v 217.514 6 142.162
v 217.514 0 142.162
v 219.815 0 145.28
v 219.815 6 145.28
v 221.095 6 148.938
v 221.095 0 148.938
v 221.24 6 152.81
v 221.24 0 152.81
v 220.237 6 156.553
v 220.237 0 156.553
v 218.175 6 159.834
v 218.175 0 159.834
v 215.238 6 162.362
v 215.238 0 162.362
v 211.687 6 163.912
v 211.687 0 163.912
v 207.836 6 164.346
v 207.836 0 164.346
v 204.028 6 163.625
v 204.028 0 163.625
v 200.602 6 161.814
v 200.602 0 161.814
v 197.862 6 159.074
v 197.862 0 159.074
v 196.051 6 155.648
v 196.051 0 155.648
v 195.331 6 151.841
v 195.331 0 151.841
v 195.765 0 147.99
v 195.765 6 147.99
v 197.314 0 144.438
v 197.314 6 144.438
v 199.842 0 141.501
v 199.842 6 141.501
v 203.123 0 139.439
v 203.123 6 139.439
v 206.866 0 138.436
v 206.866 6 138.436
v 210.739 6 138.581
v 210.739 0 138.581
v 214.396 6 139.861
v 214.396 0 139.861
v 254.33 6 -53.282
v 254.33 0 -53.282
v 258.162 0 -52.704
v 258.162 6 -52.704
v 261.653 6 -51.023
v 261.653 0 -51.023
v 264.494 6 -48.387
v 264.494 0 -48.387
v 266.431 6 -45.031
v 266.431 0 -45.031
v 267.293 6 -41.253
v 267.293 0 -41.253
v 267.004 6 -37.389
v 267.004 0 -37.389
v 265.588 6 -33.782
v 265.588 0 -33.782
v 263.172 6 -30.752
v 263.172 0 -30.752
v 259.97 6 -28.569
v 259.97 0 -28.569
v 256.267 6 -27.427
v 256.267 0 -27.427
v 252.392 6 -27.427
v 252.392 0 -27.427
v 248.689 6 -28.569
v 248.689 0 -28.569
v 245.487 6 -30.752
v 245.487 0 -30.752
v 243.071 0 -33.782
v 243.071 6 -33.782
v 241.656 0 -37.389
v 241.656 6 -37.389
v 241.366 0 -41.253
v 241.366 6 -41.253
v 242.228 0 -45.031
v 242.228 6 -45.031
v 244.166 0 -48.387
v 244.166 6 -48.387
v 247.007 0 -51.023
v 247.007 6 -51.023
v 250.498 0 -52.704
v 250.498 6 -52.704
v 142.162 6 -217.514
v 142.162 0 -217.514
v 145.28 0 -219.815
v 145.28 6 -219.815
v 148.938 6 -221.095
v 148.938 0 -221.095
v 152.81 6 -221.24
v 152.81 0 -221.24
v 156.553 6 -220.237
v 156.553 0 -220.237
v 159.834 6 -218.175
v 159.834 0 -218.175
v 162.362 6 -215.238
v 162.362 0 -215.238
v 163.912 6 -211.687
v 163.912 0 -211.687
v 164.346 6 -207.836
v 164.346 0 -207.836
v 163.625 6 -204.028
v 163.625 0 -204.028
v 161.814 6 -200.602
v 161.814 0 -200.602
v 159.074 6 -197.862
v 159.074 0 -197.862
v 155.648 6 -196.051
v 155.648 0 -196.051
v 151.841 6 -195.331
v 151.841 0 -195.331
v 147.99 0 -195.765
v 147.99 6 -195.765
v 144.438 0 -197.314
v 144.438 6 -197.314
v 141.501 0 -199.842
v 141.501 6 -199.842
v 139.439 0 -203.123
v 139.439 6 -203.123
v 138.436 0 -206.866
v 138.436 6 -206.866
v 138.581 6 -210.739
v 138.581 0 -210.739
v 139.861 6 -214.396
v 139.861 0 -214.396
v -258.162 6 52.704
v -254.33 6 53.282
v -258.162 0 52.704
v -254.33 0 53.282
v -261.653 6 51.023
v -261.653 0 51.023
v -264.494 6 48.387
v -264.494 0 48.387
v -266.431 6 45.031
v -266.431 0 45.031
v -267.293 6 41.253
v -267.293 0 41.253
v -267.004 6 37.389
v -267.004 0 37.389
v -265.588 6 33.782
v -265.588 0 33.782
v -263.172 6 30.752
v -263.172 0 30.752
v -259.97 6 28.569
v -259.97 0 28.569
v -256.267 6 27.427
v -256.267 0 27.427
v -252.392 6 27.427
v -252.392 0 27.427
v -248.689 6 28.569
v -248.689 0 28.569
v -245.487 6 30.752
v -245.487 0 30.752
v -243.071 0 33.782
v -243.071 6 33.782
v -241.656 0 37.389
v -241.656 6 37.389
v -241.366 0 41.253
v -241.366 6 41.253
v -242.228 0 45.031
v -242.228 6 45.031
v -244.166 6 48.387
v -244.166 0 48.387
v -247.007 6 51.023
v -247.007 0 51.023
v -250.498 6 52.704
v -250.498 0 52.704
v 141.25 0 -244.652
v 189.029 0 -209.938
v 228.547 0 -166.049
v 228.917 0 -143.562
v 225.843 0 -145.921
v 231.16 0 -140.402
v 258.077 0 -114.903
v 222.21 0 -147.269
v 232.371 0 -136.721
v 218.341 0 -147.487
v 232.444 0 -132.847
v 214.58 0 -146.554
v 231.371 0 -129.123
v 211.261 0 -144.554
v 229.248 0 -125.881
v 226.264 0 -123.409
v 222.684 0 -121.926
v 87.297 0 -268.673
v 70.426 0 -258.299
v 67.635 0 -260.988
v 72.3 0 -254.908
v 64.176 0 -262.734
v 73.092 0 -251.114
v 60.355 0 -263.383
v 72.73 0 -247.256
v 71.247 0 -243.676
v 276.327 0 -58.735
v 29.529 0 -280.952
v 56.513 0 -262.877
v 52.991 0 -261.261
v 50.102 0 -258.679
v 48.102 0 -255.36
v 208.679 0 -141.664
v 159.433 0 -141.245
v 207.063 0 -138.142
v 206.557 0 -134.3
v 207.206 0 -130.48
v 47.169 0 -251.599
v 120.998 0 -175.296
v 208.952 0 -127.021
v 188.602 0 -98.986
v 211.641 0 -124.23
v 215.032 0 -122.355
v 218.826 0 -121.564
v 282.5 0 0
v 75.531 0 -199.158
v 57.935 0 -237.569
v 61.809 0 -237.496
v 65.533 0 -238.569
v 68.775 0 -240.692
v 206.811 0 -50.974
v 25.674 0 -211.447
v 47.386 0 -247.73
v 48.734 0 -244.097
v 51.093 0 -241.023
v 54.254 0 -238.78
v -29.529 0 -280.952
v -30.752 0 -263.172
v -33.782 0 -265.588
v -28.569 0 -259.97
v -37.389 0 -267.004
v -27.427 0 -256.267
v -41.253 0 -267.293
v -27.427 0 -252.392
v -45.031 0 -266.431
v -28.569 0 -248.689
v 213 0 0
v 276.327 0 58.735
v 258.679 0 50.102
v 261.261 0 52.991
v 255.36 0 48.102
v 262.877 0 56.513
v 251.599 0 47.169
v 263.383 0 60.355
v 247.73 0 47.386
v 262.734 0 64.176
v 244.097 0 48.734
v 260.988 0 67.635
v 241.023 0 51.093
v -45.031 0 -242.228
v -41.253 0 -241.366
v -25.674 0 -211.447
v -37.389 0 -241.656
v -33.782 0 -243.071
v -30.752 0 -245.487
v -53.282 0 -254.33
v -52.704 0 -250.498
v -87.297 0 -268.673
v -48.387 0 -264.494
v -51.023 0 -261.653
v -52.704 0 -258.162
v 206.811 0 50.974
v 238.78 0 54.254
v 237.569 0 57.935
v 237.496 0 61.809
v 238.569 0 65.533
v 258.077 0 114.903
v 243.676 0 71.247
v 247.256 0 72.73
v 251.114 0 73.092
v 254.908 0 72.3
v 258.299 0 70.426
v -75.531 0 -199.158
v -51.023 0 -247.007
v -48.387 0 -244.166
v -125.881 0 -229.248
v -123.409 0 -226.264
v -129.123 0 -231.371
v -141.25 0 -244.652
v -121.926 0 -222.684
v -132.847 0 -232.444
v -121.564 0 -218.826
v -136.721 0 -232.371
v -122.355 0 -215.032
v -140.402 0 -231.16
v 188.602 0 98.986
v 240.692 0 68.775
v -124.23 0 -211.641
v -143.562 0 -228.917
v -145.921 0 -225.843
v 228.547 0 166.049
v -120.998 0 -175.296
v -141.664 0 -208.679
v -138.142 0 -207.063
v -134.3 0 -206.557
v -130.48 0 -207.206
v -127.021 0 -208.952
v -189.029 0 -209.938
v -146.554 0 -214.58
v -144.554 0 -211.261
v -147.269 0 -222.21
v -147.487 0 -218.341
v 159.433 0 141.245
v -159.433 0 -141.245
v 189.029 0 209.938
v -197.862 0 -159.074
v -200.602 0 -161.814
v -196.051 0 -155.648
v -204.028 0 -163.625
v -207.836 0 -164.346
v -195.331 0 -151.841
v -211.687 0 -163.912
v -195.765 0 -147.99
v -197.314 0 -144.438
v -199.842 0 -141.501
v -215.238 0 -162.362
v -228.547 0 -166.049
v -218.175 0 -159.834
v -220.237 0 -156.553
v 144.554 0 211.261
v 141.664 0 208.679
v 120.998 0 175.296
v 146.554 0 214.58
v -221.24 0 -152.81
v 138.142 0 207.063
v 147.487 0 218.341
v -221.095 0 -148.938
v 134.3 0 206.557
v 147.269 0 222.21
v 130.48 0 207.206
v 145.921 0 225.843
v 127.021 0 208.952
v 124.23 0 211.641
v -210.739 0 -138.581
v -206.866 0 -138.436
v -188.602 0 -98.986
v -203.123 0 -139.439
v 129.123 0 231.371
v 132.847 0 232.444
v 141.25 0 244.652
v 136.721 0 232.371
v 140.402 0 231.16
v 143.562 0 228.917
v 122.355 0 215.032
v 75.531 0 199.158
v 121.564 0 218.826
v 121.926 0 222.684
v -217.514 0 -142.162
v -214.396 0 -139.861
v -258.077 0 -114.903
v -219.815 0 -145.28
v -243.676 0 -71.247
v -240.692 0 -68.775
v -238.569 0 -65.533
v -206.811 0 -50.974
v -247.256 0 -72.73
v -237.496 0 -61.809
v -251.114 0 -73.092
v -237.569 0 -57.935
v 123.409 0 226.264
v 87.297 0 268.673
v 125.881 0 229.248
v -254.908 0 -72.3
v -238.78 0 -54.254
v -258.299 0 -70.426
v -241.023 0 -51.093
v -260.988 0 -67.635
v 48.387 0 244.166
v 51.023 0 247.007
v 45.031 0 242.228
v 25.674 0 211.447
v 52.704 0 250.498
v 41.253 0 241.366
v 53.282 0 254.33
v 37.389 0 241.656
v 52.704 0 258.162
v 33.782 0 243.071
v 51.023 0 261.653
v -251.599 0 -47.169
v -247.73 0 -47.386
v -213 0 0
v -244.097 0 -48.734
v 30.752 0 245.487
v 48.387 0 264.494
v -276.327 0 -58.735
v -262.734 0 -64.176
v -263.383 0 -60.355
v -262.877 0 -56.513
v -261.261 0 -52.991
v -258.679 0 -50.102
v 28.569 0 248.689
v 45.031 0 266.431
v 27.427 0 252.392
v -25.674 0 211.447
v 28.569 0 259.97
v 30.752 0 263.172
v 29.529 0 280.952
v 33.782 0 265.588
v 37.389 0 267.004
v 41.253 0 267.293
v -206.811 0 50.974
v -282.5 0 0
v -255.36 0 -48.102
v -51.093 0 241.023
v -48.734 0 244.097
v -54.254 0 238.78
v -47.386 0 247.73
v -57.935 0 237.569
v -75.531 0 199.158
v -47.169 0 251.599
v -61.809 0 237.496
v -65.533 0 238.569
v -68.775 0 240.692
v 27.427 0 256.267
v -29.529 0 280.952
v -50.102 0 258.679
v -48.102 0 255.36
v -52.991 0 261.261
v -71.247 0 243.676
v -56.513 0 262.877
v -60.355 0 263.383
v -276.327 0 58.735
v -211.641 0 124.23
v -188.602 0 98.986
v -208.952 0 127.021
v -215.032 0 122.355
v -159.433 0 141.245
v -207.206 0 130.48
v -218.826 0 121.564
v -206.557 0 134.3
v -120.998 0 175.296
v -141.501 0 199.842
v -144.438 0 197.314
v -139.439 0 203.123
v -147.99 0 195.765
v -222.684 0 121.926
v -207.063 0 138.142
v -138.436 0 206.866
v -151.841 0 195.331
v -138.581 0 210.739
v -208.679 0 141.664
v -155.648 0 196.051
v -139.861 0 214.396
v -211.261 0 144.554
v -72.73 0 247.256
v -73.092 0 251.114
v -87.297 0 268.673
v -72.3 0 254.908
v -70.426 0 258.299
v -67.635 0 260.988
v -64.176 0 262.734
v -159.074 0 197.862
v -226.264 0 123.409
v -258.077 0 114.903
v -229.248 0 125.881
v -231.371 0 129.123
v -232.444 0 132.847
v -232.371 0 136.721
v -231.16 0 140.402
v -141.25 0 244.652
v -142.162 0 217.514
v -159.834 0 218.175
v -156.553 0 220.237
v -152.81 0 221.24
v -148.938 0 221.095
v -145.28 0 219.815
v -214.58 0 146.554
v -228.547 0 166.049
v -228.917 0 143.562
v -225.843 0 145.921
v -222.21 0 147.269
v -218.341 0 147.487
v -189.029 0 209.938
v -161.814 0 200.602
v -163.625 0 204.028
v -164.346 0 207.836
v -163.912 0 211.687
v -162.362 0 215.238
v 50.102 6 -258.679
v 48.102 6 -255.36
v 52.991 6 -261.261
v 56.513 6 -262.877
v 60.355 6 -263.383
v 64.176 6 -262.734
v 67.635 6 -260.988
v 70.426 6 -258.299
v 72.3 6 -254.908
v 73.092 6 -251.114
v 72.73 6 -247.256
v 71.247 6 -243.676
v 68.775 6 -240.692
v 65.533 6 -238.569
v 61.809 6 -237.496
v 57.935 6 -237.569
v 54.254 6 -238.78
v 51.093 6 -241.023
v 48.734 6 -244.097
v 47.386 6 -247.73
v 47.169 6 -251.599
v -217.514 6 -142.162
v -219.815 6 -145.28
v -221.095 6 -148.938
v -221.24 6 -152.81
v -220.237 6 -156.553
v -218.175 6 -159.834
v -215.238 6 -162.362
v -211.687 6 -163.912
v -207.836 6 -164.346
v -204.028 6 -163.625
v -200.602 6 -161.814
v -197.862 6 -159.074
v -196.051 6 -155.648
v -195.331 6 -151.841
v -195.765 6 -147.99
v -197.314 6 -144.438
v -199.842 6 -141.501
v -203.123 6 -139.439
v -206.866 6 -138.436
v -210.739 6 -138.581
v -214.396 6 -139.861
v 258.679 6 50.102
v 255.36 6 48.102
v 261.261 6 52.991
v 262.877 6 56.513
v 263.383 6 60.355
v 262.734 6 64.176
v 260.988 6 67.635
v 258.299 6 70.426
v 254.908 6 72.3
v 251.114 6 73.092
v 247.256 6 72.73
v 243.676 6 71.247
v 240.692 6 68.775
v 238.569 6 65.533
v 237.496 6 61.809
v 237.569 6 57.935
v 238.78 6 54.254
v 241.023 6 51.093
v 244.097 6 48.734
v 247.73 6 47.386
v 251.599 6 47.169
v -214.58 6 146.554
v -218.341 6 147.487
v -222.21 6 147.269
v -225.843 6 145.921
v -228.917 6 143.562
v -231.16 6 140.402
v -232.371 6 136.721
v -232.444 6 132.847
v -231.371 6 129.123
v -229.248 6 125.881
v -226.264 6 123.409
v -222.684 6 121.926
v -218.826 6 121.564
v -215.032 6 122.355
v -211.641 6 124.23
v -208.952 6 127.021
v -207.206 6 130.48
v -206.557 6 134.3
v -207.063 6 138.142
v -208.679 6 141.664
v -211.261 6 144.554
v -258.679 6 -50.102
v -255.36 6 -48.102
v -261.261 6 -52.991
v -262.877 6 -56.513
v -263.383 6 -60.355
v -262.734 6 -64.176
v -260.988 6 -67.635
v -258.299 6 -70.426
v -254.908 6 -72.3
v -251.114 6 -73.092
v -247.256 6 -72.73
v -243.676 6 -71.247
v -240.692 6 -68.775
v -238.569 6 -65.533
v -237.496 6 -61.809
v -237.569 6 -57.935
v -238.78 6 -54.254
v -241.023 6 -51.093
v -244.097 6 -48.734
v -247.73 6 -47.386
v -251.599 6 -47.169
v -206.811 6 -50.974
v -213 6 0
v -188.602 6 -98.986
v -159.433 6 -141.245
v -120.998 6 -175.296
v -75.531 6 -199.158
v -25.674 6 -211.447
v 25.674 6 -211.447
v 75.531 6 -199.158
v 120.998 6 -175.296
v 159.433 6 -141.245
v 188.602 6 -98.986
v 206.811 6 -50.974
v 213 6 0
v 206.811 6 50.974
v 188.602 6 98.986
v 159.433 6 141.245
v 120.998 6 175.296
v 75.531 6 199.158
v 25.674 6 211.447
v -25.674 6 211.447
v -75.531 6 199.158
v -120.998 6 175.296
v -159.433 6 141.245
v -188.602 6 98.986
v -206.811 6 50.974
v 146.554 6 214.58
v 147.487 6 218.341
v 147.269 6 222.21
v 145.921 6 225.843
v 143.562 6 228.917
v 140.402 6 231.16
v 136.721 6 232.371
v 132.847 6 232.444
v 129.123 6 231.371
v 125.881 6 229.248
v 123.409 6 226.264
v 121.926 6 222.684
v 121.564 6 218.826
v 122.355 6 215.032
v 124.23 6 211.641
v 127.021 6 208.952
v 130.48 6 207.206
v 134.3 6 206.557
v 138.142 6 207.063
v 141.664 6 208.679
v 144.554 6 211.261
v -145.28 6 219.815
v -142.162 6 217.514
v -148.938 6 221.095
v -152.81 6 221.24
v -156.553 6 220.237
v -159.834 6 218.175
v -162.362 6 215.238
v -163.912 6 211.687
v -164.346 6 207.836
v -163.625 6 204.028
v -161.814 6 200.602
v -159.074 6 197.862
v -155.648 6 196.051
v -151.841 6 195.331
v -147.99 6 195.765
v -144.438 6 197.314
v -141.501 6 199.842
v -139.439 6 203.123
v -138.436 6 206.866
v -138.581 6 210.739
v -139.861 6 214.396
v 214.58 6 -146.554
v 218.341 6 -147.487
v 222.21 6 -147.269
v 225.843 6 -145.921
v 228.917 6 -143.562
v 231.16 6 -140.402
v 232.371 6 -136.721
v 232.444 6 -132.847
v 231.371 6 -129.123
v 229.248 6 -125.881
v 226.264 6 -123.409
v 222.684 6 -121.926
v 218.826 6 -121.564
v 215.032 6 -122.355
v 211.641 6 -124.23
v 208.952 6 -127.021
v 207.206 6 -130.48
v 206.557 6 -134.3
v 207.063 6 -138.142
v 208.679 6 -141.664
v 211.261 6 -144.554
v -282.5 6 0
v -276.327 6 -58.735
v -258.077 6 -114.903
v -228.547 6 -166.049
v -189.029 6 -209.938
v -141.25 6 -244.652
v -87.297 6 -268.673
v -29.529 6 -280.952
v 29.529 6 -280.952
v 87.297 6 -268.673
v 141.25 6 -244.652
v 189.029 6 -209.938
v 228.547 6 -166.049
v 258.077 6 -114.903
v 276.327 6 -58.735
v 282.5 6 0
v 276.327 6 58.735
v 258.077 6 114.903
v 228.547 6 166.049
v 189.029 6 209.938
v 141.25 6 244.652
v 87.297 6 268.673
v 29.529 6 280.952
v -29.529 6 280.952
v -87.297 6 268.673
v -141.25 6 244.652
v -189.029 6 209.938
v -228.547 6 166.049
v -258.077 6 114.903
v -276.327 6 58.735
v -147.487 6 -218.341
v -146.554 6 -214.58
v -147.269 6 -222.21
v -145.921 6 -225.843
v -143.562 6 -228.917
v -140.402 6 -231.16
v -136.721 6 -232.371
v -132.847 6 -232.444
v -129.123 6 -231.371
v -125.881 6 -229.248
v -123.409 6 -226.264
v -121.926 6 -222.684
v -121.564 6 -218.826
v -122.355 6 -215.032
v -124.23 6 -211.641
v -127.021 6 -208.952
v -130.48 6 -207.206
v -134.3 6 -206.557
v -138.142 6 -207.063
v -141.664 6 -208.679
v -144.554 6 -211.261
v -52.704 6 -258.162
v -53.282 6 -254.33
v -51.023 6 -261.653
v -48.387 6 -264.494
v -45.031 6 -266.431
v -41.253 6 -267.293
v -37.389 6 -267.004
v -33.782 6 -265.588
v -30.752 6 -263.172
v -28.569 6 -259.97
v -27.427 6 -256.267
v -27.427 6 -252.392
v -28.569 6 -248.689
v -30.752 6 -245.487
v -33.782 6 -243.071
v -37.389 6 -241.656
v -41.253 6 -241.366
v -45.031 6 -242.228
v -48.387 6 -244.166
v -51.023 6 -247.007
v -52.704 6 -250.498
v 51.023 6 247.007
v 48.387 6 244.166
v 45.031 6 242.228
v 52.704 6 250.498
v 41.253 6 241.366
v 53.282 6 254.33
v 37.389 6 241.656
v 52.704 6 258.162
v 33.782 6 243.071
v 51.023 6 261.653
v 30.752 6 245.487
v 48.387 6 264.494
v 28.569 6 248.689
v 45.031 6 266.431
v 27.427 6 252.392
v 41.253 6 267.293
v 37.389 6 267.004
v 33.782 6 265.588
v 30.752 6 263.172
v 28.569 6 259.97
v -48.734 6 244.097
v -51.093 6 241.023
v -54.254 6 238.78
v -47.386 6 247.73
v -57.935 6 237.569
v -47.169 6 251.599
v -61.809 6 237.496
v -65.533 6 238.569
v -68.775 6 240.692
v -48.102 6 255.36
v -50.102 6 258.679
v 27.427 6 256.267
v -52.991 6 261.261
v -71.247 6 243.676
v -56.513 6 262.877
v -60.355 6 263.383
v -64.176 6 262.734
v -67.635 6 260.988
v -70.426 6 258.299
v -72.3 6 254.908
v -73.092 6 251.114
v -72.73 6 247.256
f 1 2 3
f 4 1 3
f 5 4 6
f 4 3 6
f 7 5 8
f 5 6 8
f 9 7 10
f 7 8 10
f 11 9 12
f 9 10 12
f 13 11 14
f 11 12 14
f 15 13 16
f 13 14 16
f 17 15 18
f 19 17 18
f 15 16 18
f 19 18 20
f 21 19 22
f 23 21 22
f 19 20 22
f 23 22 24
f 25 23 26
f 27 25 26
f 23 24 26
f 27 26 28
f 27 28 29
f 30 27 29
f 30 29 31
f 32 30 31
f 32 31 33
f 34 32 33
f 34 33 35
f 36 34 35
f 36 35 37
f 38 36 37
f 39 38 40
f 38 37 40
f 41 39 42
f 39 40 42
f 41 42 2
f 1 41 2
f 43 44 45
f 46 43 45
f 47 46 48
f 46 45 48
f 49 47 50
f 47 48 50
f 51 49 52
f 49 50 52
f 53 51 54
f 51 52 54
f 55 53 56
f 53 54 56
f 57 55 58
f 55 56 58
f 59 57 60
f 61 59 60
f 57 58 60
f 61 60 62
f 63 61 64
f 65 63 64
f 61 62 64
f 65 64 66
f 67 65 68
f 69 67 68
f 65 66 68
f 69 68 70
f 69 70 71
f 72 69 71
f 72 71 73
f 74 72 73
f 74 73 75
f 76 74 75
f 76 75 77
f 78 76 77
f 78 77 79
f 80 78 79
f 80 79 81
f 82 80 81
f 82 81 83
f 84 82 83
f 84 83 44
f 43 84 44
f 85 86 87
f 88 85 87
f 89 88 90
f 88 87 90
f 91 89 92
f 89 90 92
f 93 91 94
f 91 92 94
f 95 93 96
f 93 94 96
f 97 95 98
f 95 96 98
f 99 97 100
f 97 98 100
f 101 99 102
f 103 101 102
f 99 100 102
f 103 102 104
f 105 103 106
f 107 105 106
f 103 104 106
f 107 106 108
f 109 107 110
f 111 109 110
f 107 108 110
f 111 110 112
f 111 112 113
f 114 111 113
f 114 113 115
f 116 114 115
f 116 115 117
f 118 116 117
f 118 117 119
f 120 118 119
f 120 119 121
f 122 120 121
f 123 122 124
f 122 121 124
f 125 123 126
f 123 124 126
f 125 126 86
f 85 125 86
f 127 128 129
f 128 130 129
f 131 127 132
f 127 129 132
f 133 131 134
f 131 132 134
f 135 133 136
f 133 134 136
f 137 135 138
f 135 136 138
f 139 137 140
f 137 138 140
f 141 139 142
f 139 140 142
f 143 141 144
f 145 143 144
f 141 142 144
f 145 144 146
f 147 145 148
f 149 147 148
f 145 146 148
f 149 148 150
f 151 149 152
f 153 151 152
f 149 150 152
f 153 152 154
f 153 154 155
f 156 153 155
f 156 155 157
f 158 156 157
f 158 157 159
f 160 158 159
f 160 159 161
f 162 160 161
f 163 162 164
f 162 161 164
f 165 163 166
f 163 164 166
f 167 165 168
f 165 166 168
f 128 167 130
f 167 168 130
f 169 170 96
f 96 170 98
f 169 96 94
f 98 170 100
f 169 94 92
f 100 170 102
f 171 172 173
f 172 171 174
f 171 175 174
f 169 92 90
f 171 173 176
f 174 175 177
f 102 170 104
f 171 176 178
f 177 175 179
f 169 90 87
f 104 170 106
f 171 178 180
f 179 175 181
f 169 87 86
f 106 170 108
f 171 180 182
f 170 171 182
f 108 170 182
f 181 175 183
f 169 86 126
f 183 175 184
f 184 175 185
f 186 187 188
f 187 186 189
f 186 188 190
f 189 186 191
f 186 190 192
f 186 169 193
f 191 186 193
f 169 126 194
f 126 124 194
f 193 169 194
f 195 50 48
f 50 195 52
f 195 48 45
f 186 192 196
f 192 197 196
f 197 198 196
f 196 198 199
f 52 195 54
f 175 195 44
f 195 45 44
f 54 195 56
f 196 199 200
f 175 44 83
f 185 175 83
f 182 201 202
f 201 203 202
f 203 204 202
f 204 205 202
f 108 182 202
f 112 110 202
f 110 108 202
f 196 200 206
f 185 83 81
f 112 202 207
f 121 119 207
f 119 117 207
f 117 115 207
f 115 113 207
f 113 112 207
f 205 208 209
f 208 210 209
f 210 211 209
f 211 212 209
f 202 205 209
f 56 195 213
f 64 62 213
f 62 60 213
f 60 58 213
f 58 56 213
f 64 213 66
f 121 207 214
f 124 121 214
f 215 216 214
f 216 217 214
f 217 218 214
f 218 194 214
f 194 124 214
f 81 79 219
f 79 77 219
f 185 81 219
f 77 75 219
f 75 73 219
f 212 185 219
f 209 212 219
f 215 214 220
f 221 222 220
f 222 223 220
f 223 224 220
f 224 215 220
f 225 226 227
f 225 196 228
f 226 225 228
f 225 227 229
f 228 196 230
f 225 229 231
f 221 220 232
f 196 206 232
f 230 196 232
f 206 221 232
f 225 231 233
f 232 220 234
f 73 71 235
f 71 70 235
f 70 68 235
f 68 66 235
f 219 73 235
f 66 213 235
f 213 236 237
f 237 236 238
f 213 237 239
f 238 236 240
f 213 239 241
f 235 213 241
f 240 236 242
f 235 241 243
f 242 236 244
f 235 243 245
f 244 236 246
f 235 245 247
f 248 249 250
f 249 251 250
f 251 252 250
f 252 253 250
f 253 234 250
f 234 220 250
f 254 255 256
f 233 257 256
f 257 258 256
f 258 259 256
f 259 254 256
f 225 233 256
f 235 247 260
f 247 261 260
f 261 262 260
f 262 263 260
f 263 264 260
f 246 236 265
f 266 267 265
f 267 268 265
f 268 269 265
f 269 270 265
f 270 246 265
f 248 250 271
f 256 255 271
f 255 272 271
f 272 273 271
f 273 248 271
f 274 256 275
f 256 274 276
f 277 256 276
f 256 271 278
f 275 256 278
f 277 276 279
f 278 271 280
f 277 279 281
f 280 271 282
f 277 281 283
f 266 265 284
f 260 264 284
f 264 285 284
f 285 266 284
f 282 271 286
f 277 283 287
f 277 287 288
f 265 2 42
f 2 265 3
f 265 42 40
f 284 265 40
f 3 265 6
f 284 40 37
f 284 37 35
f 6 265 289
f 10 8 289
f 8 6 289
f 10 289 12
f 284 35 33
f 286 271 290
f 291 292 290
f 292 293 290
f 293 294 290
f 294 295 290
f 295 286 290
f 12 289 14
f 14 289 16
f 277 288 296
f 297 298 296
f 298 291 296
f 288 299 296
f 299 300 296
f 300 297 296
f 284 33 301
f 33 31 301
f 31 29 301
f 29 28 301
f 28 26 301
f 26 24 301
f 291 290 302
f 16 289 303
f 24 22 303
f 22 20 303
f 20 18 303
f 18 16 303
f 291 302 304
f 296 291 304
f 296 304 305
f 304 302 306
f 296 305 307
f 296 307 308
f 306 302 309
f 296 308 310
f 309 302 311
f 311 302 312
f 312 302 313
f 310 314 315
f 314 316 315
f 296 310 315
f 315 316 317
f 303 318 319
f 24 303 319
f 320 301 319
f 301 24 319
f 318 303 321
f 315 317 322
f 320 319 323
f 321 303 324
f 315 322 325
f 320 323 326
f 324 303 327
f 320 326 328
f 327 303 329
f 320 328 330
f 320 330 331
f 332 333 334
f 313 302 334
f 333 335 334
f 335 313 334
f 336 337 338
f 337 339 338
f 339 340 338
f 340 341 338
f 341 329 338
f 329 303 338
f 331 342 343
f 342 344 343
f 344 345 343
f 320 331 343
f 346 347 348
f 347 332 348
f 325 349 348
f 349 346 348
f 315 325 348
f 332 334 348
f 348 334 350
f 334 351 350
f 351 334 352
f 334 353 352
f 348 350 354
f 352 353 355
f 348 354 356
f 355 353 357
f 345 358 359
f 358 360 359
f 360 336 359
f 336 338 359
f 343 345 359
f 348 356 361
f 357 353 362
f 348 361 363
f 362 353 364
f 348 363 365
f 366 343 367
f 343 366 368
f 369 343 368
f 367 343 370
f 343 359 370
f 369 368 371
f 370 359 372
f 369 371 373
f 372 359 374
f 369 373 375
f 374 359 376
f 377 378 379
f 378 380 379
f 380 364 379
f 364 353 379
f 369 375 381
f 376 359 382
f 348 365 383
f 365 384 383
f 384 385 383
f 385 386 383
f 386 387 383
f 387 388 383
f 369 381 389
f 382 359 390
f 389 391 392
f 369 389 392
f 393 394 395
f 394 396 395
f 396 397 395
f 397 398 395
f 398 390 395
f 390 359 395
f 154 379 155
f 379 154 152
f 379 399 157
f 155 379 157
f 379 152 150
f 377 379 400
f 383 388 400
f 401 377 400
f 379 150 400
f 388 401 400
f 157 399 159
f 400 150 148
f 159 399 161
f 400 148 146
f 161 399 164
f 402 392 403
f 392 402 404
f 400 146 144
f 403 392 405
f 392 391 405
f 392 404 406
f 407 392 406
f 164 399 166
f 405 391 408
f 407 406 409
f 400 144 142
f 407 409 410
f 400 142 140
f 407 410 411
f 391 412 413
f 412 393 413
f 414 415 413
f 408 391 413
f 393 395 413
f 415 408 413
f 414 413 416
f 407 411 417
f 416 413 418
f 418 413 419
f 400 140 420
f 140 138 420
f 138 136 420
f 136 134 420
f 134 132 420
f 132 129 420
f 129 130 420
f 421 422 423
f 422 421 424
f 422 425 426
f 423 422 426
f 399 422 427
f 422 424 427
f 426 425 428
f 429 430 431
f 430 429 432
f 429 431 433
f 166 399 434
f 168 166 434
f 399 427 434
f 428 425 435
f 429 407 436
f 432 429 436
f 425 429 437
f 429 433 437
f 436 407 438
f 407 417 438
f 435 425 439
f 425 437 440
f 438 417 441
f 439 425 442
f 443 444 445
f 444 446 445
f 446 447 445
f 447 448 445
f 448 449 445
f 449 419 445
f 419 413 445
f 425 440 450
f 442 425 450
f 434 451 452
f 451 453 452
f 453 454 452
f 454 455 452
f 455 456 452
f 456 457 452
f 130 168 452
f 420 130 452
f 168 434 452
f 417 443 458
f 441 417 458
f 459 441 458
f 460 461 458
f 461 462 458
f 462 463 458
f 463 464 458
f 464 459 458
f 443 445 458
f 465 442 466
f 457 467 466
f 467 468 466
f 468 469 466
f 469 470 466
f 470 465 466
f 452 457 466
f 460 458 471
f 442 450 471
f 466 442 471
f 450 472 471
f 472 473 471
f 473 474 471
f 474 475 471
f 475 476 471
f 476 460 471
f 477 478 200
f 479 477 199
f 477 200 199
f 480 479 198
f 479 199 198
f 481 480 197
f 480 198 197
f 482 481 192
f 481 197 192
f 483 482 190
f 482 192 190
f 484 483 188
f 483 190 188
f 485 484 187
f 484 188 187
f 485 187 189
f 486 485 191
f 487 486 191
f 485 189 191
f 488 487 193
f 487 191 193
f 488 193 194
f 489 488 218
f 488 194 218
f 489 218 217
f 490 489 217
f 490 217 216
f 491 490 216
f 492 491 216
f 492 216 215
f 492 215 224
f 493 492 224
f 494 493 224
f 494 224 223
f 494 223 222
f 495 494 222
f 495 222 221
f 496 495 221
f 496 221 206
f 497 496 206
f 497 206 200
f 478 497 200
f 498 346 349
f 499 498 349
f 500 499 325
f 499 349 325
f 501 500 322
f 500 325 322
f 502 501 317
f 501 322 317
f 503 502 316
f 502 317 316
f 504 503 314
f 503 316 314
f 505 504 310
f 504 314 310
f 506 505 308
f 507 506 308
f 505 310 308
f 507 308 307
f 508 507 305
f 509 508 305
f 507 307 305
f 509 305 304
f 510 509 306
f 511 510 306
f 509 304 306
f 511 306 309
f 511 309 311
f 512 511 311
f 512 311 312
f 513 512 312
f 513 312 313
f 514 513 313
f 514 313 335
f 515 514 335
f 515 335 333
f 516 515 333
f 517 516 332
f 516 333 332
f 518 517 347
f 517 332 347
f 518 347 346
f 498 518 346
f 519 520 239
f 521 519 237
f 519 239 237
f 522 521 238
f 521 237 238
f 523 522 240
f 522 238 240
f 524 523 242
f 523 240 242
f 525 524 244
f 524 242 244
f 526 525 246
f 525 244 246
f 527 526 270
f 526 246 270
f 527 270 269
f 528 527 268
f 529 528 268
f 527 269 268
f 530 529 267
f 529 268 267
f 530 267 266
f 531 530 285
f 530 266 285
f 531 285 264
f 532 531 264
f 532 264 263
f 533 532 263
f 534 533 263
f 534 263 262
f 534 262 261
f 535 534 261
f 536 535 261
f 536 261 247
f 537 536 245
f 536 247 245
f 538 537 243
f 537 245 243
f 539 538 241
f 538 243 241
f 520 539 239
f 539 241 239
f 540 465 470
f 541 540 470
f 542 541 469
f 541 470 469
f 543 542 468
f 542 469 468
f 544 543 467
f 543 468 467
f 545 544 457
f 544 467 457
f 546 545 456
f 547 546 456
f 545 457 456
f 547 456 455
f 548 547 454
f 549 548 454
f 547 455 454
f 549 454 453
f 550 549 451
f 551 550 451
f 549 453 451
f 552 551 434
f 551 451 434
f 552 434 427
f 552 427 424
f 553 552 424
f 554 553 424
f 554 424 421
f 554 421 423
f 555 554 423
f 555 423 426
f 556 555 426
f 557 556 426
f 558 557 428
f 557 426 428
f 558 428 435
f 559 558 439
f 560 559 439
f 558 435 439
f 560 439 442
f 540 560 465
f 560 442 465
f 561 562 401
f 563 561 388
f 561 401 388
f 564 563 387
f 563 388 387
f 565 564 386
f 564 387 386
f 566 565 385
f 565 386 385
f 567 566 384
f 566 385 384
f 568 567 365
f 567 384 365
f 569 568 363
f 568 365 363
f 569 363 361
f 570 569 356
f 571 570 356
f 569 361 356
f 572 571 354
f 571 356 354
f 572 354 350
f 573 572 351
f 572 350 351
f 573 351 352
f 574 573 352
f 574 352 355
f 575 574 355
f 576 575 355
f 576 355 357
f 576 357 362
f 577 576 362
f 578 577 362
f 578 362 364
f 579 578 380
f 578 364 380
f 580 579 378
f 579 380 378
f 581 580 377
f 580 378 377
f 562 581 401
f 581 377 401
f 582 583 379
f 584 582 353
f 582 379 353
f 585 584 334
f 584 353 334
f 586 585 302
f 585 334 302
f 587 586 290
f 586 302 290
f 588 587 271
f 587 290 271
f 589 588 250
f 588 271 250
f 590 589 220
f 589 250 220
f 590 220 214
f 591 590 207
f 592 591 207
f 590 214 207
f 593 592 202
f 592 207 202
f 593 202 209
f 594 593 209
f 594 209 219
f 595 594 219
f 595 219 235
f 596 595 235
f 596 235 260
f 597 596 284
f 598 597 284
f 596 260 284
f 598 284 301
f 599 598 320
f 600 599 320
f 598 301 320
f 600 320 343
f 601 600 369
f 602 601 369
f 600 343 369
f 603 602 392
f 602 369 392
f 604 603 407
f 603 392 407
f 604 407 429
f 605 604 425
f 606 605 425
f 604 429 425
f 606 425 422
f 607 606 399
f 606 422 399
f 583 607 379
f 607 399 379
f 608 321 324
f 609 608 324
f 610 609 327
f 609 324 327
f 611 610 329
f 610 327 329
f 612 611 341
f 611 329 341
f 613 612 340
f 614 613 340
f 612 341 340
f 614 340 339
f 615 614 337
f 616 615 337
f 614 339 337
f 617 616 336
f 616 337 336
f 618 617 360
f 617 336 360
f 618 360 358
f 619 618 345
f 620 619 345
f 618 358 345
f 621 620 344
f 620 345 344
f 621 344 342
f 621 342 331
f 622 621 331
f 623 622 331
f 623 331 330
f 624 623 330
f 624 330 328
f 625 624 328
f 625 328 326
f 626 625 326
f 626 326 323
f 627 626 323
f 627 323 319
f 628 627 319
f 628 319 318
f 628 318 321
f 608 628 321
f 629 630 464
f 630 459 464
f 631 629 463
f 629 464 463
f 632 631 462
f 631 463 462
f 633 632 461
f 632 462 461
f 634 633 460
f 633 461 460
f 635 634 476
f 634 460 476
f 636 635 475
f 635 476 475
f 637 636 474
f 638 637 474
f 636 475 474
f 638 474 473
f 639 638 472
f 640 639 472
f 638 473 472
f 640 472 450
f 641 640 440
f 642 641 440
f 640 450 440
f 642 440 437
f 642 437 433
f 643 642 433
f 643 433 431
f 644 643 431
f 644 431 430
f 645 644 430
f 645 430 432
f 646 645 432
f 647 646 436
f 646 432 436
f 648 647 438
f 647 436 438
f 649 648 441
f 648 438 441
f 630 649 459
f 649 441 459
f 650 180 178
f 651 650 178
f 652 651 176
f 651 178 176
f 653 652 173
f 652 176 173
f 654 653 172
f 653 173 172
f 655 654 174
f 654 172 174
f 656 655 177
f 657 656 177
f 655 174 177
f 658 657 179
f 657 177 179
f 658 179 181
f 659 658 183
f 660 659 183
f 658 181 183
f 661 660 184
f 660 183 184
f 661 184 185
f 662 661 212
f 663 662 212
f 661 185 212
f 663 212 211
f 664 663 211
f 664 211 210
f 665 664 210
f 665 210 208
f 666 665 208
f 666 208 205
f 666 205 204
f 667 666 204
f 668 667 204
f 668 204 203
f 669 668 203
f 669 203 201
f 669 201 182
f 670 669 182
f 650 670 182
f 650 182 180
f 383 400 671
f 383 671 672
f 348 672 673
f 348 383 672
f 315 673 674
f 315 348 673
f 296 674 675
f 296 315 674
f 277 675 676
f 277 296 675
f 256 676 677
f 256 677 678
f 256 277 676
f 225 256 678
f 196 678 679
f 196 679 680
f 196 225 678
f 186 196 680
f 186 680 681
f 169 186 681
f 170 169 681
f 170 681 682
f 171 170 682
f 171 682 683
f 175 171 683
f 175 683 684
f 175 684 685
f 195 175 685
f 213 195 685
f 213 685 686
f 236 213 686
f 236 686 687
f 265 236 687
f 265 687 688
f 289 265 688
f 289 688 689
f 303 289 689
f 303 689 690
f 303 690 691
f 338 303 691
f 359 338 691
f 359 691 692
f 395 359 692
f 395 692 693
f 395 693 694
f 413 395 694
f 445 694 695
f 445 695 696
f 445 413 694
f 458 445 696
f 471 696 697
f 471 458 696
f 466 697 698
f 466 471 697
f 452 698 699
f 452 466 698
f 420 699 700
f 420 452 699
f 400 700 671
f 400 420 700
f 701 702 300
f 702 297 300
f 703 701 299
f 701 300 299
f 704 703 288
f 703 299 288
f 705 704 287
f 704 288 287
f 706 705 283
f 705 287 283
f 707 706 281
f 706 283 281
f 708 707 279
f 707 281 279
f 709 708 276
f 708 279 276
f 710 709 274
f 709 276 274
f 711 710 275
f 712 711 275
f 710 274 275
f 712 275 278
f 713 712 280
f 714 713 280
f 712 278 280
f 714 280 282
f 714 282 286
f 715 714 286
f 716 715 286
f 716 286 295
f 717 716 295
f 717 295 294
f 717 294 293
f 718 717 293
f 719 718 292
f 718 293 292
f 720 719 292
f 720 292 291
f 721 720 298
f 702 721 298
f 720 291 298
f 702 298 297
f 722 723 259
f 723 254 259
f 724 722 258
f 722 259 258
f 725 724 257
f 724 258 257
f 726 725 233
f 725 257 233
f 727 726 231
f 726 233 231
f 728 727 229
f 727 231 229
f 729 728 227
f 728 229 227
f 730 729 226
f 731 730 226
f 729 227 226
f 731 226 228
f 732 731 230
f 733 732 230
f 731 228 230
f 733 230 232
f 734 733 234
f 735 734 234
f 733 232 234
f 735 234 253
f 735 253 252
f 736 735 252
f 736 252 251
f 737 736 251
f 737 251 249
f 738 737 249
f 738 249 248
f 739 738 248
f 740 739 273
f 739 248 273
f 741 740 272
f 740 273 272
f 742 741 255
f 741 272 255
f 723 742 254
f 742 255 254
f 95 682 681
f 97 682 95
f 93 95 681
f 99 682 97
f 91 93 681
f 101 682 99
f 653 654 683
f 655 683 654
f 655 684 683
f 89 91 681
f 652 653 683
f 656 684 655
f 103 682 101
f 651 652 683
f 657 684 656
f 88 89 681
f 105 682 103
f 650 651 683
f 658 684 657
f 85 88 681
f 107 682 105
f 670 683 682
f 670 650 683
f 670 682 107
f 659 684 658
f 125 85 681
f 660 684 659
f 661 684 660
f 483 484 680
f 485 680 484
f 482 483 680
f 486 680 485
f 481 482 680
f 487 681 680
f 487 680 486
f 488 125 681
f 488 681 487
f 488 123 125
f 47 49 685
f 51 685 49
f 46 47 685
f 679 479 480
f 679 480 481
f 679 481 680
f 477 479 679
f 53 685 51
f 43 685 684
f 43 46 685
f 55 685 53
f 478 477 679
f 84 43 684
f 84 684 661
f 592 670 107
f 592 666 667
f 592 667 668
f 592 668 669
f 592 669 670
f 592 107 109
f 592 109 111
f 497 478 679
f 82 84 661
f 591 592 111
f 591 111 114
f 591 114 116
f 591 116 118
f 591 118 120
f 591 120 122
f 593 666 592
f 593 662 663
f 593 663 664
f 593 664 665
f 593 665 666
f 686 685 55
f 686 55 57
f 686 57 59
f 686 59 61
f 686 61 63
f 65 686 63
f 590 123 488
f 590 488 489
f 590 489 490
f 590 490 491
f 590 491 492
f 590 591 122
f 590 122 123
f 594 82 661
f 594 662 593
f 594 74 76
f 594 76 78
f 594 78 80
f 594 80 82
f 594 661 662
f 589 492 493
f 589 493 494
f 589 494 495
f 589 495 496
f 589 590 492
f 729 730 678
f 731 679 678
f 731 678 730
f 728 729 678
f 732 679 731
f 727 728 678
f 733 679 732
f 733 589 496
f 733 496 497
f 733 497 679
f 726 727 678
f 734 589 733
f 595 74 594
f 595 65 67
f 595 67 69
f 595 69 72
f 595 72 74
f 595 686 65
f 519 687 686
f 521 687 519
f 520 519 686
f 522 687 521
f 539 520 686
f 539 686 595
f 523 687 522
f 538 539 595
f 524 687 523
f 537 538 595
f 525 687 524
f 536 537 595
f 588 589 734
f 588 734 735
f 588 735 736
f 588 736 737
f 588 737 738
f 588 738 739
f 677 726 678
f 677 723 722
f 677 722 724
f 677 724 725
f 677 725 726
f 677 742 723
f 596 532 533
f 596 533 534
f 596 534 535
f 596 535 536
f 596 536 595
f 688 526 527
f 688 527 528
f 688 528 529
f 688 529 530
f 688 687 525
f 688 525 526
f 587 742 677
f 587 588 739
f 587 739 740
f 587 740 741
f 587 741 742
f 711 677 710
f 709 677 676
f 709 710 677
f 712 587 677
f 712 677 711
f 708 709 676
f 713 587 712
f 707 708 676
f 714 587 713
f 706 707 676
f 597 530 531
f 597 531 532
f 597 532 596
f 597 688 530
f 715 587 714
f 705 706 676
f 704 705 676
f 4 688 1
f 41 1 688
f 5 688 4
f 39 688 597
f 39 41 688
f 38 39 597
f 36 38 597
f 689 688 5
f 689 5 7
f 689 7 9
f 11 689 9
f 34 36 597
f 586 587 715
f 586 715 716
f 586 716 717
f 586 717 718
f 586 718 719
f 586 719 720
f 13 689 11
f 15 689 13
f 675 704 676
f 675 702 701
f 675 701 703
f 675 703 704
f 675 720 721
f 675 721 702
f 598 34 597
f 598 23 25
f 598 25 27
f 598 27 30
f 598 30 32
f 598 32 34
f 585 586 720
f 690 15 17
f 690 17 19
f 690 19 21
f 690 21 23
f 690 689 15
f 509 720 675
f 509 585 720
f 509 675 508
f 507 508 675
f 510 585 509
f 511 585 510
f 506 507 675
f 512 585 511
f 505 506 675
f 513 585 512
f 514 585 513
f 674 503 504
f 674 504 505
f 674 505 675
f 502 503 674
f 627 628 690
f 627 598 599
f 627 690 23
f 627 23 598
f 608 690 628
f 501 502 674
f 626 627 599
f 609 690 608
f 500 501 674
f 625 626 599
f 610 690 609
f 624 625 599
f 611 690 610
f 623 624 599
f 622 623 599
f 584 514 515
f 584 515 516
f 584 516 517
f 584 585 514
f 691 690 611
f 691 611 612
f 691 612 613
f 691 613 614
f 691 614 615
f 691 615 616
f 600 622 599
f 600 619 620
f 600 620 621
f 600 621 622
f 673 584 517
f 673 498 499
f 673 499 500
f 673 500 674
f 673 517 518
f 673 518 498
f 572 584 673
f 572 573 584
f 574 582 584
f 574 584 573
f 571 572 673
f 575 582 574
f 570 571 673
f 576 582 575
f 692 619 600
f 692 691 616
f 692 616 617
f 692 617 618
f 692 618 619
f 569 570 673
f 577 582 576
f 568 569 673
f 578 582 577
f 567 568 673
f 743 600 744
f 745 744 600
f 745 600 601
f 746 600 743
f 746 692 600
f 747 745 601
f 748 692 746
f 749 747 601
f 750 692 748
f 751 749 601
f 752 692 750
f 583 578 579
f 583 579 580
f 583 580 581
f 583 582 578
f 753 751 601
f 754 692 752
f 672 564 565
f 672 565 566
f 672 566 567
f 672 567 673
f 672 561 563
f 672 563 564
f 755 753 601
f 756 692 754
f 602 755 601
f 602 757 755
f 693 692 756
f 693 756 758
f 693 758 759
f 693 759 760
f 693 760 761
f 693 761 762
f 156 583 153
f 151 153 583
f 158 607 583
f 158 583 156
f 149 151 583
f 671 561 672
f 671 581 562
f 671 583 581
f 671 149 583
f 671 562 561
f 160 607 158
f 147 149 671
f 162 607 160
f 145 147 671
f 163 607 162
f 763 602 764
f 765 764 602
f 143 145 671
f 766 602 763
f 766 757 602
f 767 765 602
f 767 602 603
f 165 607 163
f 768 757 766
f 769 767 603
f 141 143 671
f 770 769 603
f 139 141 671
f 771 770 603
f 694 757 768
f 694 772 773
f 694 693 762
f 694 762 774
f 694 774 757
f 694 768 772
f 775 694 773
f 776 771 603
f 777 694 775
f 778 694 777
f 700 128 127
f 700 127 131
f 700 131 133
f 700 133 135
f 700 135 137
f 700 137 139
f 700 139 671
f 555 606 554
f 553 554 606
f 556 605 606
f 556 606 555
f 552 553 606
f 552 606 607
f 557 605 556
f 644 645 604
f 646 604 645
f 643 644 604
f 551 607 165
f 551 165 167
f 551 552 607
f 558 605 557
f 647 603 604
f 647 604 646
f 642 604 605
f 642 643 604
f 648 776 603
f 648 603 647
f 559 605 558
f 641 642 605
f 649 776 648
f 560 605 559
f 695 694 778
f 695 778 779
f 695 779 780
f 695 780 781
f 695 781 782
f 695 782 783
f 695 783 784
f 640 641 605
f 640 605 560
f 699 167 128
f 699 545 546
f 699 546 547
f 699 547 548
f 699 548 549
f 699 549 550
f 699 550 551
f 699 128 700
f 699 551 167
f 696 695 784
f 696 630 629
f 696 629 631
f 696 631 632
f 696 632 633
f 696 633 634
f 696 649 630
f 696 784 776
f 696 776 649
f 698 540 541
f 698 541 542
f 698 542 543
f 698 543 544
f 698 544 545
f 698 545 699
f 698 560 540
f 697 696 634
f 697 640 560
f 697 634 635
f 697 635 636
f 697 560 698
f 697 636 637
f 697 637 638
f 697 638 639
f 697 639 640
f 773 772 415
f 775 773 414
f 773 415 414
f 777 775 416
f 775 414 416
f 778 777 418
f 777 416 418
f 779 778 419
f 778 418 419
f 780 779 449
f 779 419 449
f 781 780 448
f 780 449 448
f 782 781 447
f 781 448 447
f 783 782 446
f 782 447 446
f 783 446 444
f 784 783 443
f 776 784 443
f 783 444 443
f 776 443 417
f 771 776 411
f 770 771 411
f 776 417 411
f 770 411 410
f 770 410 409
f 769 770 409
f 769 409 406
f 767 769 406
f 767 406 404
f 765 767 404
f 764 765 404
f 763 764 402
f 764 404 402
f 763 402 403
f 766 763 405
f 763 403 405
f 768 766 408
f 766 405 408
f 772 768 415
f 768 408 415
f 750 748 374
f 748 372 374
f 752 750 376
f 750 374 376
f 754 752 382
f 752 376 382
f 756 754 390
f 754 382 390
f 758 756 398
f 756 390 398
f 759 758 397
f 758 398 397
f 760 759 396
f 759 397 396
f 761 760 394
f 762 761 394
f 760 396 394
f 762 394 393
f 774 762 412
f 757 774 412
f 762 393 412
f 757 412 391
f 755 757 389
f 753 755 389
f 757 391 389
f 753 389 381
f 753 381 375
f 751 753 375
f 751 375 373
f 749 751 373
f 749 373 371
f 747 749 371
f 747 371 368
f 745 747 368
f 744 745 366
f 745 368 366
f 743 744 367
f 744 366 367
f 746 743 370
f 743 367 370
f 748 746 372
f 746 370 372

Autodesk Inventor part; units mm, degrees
ref_plane "YZ Plane" through (0, 0, 0) normal (1, 0, 0) x (0, 1, 0)
ref_plane "XZ Plane" through (0, 0, 0) normal (0, 1, 0) x (-1, 0, 0)
ref_plane "XY Plane" through (0, 0, 0) normal (0, 0, 1) x (1, 0, 0)
sketch "Sketch1" plane through (0, 0, 0) normal (0, 1, 0) x (-1, 0, 0)
  circle A0 centre (0, 0) radius 213
  circle A1 centre (0, 0) radius 282.5
  line L0 (282.5, 0) -> (213, 0)
  line L1 (-213, 0) -> (-282.5, 0)
  line L2 (0, 213) -> (0, 282.5)
  point P0 (247.75, 0)
  point P1 (-247.75, 0)
  point P2 (0, 247.75)
  dimension "d1" = 565
  dimension "d4" = 426
extrude "Extrusion1" add sketch "Sketch1" along normal blind 6 contours L0 A1 L1 A0 | A0 L2 A1 L0 | A0 L1 A1 L2
sketch "Sketch2" plane through (0, 0, 0) normal (0, -1, 0) x (1, 0, 0)
  circle A0 centre (0, 0) radius 282.5 projected
  circle A1 centre (0, 0) radius 213 projected
  circle A2 centre (40.2819, 254.3297) radius 13
  circle A3 centre (0, 0) radius 213 projected
  line L0 (40.2819, 254.3297) -> (0, 0)
  point P0 (0, 213)
  point P1 (265, 0)
  dimension "d5" = 257.5
  dimension "d7" = 26
extrude "Cut1" cut sketch "Sketch2" against normal blind 6 contours A2
pattern_circular "Circular Pattern1" count 16 over 360 about axis through (0, 0, 0) along (0, 1, 0) of "Cut1"
equation "\"d1\" = Charging_hatch_width"
equation "\"d4\" = Accsess_hatch_diameter"
equation "\"d9\" = Thickness"
equation "\"BendRadius\" = Thickness"
equation "\"BendReliefWidth\" = Thickness"
equation "\"BendReliefDepth\" = 0.5 * Thickness"
equation "\"CornerReliefSize\" = 4 * Thickness"
equation "\"MinimumRemnant\" = 2 * Thickness"
equation "\"TransitionRadius\" = BendRadius"
equation "\"JacobiRadiusSize\" = BendRadius"
equation "\"GapSize\" = Thickness"
equation "\"d8\" = Thickness"
equation "\"Charging_hatch_width\" = 565"
equation "\"Accsess_hatch_diameter\" = 426"
equation "\"Thickness\" = 6"
properties part number "TZS 1203 accses hatch flange" material "Steel"
